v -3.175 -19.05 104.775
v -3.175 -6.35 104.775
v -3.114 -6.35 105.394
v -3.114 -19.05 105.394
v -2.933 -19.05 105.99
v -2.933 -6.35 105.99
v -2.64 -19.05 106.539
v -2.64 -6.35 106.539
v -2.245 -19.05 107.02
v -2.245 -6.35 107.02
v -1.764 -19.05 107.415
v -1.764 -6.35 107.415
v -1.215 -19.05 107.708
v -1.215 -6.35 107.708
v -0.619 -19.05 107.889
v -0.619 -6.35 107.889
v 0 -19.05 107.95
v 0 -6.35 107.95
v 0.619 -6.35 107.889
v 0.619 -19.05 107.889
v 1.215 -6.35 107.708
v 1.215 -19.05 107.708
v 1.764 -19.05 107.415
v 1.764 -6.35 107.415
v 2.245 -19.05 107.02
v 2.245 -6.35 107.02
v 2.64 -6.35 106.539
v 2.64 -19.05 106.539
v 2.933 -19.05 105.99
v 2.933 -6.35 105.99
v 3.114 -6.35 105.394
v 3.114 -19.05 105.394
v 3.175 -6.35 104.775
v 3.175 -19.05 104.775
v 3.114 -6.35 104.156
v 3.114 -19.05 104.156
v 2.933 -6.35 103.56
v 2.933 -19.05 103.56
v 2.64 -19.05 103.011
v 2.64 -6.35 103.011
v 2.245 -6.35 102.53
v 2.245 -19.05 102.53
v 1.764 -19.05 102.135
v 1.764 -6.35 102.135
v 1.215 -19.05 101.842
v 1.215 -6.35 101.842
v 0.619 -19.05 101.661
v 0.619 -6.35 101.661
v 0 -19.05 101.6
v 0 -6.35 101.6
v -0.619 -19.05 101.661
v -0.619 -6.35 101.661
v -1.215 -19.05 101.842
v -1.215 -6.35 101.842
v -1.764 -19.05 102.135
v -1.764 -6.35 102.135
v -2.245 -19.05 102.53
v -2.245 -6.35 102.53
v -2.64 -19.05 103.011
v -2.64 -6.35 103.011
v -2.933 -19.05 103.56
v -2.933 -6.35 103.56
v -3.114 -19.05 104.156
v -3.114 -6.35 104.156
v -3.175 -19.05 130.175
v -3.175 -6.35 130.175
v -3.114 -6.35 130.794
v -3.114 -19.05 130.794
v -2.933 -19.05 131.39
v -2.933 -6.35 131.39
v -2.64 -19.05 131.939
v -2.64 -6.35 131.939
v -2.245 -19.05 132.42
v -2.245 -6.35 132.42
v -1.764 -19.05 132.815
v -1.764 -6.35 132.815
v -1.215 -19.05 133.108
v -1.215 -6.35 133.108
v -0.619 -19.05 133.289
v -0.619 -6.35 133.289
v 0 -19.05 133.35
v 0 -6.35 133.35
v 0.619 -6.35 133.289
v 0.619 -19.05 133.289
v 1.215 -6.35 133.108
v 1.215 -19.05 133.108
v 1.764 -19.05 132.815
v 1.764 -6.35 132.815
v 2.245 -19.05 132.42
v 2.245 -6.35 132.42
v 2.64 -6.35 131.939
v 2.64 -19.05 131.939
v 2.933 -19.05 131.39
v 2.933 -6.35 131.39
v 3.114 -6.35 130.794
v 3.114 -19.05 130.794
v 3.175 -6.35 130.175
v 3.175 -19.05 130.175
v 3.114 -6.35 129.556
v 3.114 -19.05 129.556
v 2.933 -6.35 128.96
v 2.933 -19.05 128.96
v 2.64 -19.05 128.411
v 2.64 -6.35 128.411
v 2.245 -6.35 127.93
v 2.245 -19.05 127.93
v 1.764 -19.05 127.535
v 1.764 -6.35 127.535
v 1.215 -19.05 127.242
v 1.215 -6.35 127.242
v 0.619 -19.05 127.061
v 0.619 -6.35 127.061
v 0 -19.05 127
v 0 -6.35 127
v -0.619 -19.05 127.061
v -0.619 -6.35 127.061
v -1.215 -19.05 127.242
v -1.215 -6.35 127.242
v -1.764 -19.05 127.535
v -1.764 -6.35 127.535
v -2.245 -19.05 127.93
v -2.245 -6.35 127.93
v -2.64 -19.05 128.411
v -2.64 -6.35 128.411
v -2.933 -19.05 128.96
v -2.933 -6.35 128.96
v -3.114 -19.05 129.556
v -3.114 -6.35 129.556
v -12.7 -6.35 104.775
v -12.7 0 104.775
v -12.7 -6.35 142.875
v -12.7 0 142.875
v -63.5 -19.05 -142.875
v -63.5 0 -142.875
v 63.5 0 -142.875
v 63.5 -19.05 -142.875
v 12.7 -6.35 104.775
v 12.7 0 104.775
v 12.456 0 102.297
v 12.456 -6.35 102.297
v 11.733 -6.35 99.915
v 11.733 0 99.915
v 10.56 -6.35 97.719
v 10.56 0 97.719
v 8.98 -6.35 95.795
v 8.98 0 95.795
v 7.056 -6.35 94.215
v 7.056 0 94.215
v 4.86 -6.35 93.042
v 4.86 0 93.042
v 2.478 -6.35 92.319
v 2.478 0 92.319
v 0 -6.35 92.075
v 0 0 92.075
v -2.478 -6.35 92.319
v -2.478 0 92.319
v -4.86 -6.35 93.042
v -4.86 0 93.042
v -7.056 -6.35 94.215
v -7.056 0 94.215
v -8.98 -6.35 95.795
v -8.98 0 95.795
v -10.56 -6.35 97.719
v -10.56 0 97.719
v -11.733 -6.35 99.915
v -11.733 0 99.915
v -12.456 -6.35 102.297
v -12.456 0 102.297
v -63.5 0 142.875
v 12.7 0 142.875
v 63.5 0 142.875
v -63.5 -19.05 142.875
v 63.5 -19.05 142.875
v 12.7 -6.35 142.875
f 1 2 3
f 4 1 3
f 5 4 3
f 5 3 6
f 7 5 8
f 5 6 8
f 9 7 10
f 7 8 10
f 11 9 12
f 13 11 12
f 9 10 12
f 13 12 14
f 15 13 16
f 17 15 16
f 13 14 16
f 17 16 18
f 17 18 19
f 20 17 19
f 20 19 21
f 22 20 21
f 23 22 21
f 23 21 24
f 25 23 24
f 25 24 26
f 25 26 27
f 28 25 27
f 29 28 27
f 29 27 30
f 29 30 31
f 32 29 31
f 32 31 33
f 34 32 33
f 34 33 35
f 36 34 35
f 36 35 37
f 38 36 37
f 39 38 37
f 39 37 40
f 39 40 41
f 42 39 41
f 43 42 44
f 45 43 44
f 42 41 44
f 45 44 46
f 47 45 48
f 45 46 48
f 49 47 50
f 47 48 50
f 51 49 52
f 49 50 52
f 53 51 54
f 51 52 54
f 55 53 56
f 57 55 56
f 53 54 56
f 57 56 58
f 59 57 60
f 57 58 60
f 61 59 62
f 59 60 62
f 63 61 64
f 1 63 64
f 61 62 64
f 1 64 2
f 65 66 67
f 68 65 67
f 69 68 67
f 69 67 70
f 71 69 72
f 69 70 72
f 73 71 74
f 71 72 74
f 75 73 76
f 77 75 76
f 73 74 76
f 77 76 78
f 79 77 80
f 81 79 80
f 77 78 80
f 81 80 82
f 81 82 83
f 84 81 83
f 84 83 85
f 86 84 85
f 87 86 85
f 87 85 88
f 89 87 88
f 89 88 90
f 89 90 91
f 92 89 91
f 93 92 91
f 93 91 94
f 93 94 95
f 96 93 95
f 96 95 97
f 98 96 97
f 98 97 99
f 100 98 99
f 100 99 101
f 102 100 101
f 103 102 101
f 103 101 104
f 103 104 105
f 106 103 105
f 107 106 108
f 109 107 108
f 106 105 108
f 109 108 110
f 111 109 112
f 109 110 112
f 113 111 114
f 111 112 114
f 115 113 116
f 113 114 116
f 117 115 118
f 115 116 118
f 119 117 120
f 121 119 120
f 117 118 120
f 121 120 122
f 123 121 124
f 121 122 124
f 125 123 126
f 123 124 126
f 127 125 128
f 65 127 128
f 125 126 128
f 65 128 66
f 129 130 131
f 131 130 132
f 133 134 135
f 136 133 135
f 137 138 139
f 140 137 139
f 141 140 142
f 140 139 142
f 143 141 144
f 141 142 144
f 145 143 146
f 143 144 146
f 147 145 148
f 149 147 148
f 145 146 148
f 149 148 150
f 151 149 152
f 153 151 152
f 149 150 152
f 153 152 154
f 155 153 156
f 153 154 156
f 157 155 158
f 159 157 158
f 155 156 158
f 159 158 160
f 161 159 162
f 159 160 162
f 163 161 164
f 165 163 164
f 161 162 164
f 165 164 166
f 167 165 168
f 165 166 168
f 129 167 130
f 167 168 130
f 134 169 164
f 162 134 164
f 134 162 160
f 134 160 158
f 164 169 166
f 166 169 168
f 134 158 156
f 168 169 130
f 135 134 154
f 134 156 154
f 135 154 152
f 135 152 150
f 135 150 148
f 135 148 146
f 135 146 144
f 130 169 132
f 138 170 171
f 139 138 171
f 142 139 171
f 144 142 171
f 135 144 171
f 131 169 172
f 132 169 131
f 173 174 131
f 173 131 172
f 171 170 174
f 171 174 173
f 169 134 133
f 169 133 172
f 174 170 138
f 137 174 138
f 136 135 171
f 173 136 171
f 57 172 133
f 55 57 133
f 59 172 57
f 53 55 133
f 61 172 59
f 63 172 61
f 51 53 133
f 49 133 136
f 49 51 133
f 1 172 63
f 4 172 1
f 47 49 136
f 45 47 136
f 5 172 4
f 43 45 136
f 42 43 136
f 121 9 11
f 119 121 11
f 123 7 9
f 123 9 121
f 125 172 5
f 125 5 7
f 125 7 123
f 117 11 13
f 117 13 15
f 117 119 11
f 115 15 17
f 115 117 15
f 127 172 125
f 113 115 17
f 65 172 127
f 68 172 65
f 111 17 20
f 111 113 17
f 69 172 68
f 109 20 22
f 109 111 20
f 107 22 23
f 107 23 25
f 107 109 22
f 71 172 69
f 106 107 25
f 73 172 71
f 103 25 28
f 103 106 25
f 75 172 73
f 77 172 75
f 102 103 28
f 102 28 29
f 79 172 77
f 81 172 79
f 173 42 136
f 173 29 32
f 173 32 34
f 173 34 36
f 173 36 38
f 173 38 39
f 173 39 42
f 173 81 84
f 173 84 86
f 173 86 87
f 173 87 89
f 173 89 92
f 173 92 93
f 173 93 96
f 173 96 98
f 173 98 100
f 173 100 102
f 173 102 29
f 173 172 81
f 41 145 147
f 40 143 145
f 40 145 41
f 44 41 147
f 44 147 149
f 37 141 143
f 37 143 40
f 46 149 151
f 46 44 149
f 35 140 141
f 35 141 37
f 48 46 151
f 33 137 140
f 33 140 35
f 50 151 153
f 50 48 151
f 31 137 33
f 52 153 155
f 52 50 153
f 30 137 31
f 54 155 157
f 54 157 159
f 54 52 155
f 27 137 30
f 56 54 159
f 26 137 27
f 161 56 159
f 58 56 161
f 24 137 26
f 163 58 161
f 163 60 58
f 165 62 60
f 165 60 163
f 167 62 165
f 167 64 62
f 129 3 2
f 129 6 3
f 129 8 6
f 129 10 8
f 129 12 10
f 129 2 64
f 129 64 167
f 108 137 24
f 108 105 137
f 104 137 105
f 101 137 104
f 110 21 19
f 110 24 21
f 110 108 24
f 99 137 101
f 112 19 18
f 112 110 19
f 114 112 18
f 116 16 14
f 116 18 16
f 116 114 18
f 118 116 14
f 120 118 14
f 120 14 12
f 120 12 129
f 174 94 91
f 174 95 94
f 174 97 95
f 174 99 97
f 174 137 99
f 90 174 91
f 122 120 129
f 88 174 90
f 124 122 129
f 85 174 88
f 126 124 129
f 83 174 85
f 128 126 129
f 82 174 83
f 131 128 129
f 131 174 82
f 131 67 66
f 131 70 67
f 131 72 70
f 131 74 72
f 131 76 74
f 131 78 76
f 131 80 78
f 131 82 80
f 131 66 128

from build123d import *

# Parameters (mm, degrees)
F0_W     = 127
F0_H     = 285.75
F1_DEPTH = 19.05
F3_DEPTH = 6.35
F4_R     = 3.175
F5_DEPTH = 12.701


with BuildPart() as f1:
    # F0 (on Front) → F1 (new body)
    with BuildSketch(Plane.XZ):
        Rectangle(F0_W, F0_H)
    extrude(amount=F1_DEPTH)

    # F2 (on face) → F3 (cut)
    with BuildSketch(Plane(origin=(0, 0, 0), x_dir=(-1, 0, 0), z_dir=(0, 1, 0))):
        with BuildLine():
            Line((12.7, 104.775), (12.7, 142.875))
            ThreePointArc((12.7, 142.875), (0, 155.575), (-12.7, 142.875))
            Line((-12.7, 142.875), (-12.7, 104.775))
            ThreePointArc((-12.7, 104.775), (0, 92.075), (12.7, 104.775))
        make_face()
    extrude(amount=-F3_DEPTH, mode=Mode.SUBTRACT)

    # F4 (on face) → F5 (cut, through all)
    with BuildSketch(Plane(origin=(0, -6.35, 0), x_dir=(-1, 0, 0), z_dir=(0, 1, 0))):
        with Locations((0, 104.775)):
            Circle(F4_R)
        with Locations((0, 130.175)):
            Circle(F4_R)
    extrude(amount=-F5_DEPTH, mode=Mode.SUBTRACT)


solid = f1.part
